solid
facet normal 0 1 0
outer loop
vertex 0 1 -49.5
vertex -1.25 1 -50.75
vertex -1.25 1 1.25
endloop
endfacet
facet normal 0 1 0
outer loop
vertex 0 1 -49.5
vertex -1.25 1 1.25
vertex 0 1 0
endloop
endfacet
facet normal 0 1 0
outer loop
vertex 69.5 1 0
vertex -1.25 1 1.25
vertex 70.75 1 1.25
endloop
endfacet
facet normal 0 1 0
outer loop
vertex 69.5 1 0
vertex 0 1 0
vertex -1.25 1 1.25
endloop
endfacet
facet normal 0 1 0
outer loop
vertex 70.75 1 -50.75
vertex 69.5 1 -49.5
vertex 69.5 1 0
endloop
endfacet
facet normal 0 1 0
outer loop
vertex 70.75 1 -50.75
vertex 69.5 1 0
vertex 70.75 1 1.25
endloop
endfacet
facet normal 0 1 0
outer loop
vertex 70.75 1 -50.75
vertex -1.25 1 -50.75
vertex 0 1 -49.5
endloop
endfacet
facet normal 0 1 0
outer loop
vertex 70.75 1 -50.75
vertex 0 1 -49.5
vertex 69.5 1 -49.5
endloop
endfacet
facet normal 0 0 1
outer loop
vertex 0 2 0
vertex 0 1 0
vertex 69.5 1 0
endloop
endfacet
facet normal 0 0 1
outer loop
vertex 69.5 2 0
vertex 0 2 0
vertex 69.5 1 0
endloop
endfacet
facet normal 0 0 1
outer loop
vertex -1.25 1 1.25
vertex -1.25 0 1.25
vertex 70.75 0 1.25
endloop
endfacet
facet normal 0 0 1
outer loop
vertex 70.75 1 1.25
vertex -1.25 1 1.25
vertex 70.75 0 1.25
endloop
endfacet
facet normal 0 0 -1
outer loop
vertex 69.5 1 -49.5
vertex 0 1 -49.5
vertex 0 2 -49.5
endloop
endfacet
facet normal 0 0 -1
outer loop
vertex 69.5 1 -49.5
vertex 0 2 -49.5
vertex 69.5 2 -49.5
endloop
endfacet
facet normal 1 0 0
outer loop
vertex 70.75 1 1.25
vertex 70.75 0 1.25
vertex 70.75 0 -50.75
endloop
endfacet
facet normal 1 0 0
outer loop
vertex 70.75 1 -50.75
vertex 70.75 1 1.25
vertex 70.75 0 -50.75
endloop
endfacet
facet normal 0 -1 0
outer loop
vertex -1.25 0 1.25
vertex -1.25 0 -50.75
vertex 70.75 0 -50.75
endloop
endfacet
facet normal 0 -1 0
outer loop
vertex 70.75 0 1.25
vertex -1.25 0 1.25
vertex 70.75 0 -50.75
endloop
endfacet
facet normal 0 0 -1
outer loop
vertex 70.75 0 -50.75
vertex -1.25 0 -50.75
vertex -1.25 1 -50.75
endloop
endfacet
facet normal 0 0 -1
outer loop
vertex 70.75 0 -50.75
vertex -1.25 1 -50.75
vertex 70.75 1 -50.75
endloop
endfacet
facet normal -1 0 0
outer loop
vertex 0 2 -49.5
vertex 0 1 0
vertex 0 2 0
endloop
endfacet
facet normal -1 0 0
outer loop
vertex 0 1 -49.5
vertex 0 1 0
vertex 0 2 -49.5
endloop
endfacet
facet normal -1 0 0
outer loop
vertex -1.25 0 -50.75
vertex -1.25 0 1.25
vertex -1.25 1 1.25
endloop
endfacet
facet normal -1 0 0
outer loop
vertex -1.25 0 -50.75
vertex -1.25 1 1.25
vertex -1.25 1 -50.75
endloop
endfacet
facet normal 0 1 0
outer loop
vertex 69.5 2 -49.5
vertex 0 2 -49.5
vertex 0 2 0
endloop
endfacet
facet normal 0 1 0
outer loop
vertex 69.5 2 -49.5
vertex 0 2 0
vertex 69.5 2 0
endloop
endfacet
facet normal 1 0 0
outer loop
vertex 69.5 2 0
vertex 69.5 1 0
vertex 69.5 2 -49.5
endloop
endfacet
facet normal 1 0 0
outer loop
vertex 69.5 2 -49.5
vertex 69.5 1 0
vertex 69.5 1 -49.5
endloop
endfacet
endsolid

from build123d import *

# Parameters (mm, degrees)
CROQUIS1_W              = 72
CROQUIS1_H              = 52
CROQUIS1_W_2            = 69.5
CROQUIS1_H_2            = 49.5
SALIENTE_EXTRUIR1_DEPTH = 1
CROQUIS1_5_W            = 69.5
CROQUIS1_5_H            = 49.5
SALIENTE_EXTRUIR3_DEPTH = 2


with BuildPart() as part:
    # Croquis1 → Saliente-Extruir1 (new body)
    with BuildSketch(Plane(origin=(0, 0, 0), x_dir=(1, 0, 0), z_dir=(0, 1, 0))):
        with Locations((34.75, 24.75)):
            Rectangle(CROQUIS1_W, CROQUIS1_H)
        with Locations((34.75, 24.75)):
            Rectangle(CROQUIS1_W_2, CROQUIS1_H_2, mode=Mode.SUBTRACT)
    extrude(amount=SALIENTE_EXTRUIR1_DEPTH)

    # Croquis1<5> → Saliente-Extruir3 (add)
    with BuildSketch(Plane(origin=(0, 0, 0), x_dir=(1, 0, 0), z_dir=(0, 1, 0))):
        with Locations((34.75, 24.75)):
            Rectangle(CROQUIS1_5_W, CROQUIS1_5_H)
    extrude(amount=SALIENTE_EXTRUIR3_DEPTH)


solid = part.part
